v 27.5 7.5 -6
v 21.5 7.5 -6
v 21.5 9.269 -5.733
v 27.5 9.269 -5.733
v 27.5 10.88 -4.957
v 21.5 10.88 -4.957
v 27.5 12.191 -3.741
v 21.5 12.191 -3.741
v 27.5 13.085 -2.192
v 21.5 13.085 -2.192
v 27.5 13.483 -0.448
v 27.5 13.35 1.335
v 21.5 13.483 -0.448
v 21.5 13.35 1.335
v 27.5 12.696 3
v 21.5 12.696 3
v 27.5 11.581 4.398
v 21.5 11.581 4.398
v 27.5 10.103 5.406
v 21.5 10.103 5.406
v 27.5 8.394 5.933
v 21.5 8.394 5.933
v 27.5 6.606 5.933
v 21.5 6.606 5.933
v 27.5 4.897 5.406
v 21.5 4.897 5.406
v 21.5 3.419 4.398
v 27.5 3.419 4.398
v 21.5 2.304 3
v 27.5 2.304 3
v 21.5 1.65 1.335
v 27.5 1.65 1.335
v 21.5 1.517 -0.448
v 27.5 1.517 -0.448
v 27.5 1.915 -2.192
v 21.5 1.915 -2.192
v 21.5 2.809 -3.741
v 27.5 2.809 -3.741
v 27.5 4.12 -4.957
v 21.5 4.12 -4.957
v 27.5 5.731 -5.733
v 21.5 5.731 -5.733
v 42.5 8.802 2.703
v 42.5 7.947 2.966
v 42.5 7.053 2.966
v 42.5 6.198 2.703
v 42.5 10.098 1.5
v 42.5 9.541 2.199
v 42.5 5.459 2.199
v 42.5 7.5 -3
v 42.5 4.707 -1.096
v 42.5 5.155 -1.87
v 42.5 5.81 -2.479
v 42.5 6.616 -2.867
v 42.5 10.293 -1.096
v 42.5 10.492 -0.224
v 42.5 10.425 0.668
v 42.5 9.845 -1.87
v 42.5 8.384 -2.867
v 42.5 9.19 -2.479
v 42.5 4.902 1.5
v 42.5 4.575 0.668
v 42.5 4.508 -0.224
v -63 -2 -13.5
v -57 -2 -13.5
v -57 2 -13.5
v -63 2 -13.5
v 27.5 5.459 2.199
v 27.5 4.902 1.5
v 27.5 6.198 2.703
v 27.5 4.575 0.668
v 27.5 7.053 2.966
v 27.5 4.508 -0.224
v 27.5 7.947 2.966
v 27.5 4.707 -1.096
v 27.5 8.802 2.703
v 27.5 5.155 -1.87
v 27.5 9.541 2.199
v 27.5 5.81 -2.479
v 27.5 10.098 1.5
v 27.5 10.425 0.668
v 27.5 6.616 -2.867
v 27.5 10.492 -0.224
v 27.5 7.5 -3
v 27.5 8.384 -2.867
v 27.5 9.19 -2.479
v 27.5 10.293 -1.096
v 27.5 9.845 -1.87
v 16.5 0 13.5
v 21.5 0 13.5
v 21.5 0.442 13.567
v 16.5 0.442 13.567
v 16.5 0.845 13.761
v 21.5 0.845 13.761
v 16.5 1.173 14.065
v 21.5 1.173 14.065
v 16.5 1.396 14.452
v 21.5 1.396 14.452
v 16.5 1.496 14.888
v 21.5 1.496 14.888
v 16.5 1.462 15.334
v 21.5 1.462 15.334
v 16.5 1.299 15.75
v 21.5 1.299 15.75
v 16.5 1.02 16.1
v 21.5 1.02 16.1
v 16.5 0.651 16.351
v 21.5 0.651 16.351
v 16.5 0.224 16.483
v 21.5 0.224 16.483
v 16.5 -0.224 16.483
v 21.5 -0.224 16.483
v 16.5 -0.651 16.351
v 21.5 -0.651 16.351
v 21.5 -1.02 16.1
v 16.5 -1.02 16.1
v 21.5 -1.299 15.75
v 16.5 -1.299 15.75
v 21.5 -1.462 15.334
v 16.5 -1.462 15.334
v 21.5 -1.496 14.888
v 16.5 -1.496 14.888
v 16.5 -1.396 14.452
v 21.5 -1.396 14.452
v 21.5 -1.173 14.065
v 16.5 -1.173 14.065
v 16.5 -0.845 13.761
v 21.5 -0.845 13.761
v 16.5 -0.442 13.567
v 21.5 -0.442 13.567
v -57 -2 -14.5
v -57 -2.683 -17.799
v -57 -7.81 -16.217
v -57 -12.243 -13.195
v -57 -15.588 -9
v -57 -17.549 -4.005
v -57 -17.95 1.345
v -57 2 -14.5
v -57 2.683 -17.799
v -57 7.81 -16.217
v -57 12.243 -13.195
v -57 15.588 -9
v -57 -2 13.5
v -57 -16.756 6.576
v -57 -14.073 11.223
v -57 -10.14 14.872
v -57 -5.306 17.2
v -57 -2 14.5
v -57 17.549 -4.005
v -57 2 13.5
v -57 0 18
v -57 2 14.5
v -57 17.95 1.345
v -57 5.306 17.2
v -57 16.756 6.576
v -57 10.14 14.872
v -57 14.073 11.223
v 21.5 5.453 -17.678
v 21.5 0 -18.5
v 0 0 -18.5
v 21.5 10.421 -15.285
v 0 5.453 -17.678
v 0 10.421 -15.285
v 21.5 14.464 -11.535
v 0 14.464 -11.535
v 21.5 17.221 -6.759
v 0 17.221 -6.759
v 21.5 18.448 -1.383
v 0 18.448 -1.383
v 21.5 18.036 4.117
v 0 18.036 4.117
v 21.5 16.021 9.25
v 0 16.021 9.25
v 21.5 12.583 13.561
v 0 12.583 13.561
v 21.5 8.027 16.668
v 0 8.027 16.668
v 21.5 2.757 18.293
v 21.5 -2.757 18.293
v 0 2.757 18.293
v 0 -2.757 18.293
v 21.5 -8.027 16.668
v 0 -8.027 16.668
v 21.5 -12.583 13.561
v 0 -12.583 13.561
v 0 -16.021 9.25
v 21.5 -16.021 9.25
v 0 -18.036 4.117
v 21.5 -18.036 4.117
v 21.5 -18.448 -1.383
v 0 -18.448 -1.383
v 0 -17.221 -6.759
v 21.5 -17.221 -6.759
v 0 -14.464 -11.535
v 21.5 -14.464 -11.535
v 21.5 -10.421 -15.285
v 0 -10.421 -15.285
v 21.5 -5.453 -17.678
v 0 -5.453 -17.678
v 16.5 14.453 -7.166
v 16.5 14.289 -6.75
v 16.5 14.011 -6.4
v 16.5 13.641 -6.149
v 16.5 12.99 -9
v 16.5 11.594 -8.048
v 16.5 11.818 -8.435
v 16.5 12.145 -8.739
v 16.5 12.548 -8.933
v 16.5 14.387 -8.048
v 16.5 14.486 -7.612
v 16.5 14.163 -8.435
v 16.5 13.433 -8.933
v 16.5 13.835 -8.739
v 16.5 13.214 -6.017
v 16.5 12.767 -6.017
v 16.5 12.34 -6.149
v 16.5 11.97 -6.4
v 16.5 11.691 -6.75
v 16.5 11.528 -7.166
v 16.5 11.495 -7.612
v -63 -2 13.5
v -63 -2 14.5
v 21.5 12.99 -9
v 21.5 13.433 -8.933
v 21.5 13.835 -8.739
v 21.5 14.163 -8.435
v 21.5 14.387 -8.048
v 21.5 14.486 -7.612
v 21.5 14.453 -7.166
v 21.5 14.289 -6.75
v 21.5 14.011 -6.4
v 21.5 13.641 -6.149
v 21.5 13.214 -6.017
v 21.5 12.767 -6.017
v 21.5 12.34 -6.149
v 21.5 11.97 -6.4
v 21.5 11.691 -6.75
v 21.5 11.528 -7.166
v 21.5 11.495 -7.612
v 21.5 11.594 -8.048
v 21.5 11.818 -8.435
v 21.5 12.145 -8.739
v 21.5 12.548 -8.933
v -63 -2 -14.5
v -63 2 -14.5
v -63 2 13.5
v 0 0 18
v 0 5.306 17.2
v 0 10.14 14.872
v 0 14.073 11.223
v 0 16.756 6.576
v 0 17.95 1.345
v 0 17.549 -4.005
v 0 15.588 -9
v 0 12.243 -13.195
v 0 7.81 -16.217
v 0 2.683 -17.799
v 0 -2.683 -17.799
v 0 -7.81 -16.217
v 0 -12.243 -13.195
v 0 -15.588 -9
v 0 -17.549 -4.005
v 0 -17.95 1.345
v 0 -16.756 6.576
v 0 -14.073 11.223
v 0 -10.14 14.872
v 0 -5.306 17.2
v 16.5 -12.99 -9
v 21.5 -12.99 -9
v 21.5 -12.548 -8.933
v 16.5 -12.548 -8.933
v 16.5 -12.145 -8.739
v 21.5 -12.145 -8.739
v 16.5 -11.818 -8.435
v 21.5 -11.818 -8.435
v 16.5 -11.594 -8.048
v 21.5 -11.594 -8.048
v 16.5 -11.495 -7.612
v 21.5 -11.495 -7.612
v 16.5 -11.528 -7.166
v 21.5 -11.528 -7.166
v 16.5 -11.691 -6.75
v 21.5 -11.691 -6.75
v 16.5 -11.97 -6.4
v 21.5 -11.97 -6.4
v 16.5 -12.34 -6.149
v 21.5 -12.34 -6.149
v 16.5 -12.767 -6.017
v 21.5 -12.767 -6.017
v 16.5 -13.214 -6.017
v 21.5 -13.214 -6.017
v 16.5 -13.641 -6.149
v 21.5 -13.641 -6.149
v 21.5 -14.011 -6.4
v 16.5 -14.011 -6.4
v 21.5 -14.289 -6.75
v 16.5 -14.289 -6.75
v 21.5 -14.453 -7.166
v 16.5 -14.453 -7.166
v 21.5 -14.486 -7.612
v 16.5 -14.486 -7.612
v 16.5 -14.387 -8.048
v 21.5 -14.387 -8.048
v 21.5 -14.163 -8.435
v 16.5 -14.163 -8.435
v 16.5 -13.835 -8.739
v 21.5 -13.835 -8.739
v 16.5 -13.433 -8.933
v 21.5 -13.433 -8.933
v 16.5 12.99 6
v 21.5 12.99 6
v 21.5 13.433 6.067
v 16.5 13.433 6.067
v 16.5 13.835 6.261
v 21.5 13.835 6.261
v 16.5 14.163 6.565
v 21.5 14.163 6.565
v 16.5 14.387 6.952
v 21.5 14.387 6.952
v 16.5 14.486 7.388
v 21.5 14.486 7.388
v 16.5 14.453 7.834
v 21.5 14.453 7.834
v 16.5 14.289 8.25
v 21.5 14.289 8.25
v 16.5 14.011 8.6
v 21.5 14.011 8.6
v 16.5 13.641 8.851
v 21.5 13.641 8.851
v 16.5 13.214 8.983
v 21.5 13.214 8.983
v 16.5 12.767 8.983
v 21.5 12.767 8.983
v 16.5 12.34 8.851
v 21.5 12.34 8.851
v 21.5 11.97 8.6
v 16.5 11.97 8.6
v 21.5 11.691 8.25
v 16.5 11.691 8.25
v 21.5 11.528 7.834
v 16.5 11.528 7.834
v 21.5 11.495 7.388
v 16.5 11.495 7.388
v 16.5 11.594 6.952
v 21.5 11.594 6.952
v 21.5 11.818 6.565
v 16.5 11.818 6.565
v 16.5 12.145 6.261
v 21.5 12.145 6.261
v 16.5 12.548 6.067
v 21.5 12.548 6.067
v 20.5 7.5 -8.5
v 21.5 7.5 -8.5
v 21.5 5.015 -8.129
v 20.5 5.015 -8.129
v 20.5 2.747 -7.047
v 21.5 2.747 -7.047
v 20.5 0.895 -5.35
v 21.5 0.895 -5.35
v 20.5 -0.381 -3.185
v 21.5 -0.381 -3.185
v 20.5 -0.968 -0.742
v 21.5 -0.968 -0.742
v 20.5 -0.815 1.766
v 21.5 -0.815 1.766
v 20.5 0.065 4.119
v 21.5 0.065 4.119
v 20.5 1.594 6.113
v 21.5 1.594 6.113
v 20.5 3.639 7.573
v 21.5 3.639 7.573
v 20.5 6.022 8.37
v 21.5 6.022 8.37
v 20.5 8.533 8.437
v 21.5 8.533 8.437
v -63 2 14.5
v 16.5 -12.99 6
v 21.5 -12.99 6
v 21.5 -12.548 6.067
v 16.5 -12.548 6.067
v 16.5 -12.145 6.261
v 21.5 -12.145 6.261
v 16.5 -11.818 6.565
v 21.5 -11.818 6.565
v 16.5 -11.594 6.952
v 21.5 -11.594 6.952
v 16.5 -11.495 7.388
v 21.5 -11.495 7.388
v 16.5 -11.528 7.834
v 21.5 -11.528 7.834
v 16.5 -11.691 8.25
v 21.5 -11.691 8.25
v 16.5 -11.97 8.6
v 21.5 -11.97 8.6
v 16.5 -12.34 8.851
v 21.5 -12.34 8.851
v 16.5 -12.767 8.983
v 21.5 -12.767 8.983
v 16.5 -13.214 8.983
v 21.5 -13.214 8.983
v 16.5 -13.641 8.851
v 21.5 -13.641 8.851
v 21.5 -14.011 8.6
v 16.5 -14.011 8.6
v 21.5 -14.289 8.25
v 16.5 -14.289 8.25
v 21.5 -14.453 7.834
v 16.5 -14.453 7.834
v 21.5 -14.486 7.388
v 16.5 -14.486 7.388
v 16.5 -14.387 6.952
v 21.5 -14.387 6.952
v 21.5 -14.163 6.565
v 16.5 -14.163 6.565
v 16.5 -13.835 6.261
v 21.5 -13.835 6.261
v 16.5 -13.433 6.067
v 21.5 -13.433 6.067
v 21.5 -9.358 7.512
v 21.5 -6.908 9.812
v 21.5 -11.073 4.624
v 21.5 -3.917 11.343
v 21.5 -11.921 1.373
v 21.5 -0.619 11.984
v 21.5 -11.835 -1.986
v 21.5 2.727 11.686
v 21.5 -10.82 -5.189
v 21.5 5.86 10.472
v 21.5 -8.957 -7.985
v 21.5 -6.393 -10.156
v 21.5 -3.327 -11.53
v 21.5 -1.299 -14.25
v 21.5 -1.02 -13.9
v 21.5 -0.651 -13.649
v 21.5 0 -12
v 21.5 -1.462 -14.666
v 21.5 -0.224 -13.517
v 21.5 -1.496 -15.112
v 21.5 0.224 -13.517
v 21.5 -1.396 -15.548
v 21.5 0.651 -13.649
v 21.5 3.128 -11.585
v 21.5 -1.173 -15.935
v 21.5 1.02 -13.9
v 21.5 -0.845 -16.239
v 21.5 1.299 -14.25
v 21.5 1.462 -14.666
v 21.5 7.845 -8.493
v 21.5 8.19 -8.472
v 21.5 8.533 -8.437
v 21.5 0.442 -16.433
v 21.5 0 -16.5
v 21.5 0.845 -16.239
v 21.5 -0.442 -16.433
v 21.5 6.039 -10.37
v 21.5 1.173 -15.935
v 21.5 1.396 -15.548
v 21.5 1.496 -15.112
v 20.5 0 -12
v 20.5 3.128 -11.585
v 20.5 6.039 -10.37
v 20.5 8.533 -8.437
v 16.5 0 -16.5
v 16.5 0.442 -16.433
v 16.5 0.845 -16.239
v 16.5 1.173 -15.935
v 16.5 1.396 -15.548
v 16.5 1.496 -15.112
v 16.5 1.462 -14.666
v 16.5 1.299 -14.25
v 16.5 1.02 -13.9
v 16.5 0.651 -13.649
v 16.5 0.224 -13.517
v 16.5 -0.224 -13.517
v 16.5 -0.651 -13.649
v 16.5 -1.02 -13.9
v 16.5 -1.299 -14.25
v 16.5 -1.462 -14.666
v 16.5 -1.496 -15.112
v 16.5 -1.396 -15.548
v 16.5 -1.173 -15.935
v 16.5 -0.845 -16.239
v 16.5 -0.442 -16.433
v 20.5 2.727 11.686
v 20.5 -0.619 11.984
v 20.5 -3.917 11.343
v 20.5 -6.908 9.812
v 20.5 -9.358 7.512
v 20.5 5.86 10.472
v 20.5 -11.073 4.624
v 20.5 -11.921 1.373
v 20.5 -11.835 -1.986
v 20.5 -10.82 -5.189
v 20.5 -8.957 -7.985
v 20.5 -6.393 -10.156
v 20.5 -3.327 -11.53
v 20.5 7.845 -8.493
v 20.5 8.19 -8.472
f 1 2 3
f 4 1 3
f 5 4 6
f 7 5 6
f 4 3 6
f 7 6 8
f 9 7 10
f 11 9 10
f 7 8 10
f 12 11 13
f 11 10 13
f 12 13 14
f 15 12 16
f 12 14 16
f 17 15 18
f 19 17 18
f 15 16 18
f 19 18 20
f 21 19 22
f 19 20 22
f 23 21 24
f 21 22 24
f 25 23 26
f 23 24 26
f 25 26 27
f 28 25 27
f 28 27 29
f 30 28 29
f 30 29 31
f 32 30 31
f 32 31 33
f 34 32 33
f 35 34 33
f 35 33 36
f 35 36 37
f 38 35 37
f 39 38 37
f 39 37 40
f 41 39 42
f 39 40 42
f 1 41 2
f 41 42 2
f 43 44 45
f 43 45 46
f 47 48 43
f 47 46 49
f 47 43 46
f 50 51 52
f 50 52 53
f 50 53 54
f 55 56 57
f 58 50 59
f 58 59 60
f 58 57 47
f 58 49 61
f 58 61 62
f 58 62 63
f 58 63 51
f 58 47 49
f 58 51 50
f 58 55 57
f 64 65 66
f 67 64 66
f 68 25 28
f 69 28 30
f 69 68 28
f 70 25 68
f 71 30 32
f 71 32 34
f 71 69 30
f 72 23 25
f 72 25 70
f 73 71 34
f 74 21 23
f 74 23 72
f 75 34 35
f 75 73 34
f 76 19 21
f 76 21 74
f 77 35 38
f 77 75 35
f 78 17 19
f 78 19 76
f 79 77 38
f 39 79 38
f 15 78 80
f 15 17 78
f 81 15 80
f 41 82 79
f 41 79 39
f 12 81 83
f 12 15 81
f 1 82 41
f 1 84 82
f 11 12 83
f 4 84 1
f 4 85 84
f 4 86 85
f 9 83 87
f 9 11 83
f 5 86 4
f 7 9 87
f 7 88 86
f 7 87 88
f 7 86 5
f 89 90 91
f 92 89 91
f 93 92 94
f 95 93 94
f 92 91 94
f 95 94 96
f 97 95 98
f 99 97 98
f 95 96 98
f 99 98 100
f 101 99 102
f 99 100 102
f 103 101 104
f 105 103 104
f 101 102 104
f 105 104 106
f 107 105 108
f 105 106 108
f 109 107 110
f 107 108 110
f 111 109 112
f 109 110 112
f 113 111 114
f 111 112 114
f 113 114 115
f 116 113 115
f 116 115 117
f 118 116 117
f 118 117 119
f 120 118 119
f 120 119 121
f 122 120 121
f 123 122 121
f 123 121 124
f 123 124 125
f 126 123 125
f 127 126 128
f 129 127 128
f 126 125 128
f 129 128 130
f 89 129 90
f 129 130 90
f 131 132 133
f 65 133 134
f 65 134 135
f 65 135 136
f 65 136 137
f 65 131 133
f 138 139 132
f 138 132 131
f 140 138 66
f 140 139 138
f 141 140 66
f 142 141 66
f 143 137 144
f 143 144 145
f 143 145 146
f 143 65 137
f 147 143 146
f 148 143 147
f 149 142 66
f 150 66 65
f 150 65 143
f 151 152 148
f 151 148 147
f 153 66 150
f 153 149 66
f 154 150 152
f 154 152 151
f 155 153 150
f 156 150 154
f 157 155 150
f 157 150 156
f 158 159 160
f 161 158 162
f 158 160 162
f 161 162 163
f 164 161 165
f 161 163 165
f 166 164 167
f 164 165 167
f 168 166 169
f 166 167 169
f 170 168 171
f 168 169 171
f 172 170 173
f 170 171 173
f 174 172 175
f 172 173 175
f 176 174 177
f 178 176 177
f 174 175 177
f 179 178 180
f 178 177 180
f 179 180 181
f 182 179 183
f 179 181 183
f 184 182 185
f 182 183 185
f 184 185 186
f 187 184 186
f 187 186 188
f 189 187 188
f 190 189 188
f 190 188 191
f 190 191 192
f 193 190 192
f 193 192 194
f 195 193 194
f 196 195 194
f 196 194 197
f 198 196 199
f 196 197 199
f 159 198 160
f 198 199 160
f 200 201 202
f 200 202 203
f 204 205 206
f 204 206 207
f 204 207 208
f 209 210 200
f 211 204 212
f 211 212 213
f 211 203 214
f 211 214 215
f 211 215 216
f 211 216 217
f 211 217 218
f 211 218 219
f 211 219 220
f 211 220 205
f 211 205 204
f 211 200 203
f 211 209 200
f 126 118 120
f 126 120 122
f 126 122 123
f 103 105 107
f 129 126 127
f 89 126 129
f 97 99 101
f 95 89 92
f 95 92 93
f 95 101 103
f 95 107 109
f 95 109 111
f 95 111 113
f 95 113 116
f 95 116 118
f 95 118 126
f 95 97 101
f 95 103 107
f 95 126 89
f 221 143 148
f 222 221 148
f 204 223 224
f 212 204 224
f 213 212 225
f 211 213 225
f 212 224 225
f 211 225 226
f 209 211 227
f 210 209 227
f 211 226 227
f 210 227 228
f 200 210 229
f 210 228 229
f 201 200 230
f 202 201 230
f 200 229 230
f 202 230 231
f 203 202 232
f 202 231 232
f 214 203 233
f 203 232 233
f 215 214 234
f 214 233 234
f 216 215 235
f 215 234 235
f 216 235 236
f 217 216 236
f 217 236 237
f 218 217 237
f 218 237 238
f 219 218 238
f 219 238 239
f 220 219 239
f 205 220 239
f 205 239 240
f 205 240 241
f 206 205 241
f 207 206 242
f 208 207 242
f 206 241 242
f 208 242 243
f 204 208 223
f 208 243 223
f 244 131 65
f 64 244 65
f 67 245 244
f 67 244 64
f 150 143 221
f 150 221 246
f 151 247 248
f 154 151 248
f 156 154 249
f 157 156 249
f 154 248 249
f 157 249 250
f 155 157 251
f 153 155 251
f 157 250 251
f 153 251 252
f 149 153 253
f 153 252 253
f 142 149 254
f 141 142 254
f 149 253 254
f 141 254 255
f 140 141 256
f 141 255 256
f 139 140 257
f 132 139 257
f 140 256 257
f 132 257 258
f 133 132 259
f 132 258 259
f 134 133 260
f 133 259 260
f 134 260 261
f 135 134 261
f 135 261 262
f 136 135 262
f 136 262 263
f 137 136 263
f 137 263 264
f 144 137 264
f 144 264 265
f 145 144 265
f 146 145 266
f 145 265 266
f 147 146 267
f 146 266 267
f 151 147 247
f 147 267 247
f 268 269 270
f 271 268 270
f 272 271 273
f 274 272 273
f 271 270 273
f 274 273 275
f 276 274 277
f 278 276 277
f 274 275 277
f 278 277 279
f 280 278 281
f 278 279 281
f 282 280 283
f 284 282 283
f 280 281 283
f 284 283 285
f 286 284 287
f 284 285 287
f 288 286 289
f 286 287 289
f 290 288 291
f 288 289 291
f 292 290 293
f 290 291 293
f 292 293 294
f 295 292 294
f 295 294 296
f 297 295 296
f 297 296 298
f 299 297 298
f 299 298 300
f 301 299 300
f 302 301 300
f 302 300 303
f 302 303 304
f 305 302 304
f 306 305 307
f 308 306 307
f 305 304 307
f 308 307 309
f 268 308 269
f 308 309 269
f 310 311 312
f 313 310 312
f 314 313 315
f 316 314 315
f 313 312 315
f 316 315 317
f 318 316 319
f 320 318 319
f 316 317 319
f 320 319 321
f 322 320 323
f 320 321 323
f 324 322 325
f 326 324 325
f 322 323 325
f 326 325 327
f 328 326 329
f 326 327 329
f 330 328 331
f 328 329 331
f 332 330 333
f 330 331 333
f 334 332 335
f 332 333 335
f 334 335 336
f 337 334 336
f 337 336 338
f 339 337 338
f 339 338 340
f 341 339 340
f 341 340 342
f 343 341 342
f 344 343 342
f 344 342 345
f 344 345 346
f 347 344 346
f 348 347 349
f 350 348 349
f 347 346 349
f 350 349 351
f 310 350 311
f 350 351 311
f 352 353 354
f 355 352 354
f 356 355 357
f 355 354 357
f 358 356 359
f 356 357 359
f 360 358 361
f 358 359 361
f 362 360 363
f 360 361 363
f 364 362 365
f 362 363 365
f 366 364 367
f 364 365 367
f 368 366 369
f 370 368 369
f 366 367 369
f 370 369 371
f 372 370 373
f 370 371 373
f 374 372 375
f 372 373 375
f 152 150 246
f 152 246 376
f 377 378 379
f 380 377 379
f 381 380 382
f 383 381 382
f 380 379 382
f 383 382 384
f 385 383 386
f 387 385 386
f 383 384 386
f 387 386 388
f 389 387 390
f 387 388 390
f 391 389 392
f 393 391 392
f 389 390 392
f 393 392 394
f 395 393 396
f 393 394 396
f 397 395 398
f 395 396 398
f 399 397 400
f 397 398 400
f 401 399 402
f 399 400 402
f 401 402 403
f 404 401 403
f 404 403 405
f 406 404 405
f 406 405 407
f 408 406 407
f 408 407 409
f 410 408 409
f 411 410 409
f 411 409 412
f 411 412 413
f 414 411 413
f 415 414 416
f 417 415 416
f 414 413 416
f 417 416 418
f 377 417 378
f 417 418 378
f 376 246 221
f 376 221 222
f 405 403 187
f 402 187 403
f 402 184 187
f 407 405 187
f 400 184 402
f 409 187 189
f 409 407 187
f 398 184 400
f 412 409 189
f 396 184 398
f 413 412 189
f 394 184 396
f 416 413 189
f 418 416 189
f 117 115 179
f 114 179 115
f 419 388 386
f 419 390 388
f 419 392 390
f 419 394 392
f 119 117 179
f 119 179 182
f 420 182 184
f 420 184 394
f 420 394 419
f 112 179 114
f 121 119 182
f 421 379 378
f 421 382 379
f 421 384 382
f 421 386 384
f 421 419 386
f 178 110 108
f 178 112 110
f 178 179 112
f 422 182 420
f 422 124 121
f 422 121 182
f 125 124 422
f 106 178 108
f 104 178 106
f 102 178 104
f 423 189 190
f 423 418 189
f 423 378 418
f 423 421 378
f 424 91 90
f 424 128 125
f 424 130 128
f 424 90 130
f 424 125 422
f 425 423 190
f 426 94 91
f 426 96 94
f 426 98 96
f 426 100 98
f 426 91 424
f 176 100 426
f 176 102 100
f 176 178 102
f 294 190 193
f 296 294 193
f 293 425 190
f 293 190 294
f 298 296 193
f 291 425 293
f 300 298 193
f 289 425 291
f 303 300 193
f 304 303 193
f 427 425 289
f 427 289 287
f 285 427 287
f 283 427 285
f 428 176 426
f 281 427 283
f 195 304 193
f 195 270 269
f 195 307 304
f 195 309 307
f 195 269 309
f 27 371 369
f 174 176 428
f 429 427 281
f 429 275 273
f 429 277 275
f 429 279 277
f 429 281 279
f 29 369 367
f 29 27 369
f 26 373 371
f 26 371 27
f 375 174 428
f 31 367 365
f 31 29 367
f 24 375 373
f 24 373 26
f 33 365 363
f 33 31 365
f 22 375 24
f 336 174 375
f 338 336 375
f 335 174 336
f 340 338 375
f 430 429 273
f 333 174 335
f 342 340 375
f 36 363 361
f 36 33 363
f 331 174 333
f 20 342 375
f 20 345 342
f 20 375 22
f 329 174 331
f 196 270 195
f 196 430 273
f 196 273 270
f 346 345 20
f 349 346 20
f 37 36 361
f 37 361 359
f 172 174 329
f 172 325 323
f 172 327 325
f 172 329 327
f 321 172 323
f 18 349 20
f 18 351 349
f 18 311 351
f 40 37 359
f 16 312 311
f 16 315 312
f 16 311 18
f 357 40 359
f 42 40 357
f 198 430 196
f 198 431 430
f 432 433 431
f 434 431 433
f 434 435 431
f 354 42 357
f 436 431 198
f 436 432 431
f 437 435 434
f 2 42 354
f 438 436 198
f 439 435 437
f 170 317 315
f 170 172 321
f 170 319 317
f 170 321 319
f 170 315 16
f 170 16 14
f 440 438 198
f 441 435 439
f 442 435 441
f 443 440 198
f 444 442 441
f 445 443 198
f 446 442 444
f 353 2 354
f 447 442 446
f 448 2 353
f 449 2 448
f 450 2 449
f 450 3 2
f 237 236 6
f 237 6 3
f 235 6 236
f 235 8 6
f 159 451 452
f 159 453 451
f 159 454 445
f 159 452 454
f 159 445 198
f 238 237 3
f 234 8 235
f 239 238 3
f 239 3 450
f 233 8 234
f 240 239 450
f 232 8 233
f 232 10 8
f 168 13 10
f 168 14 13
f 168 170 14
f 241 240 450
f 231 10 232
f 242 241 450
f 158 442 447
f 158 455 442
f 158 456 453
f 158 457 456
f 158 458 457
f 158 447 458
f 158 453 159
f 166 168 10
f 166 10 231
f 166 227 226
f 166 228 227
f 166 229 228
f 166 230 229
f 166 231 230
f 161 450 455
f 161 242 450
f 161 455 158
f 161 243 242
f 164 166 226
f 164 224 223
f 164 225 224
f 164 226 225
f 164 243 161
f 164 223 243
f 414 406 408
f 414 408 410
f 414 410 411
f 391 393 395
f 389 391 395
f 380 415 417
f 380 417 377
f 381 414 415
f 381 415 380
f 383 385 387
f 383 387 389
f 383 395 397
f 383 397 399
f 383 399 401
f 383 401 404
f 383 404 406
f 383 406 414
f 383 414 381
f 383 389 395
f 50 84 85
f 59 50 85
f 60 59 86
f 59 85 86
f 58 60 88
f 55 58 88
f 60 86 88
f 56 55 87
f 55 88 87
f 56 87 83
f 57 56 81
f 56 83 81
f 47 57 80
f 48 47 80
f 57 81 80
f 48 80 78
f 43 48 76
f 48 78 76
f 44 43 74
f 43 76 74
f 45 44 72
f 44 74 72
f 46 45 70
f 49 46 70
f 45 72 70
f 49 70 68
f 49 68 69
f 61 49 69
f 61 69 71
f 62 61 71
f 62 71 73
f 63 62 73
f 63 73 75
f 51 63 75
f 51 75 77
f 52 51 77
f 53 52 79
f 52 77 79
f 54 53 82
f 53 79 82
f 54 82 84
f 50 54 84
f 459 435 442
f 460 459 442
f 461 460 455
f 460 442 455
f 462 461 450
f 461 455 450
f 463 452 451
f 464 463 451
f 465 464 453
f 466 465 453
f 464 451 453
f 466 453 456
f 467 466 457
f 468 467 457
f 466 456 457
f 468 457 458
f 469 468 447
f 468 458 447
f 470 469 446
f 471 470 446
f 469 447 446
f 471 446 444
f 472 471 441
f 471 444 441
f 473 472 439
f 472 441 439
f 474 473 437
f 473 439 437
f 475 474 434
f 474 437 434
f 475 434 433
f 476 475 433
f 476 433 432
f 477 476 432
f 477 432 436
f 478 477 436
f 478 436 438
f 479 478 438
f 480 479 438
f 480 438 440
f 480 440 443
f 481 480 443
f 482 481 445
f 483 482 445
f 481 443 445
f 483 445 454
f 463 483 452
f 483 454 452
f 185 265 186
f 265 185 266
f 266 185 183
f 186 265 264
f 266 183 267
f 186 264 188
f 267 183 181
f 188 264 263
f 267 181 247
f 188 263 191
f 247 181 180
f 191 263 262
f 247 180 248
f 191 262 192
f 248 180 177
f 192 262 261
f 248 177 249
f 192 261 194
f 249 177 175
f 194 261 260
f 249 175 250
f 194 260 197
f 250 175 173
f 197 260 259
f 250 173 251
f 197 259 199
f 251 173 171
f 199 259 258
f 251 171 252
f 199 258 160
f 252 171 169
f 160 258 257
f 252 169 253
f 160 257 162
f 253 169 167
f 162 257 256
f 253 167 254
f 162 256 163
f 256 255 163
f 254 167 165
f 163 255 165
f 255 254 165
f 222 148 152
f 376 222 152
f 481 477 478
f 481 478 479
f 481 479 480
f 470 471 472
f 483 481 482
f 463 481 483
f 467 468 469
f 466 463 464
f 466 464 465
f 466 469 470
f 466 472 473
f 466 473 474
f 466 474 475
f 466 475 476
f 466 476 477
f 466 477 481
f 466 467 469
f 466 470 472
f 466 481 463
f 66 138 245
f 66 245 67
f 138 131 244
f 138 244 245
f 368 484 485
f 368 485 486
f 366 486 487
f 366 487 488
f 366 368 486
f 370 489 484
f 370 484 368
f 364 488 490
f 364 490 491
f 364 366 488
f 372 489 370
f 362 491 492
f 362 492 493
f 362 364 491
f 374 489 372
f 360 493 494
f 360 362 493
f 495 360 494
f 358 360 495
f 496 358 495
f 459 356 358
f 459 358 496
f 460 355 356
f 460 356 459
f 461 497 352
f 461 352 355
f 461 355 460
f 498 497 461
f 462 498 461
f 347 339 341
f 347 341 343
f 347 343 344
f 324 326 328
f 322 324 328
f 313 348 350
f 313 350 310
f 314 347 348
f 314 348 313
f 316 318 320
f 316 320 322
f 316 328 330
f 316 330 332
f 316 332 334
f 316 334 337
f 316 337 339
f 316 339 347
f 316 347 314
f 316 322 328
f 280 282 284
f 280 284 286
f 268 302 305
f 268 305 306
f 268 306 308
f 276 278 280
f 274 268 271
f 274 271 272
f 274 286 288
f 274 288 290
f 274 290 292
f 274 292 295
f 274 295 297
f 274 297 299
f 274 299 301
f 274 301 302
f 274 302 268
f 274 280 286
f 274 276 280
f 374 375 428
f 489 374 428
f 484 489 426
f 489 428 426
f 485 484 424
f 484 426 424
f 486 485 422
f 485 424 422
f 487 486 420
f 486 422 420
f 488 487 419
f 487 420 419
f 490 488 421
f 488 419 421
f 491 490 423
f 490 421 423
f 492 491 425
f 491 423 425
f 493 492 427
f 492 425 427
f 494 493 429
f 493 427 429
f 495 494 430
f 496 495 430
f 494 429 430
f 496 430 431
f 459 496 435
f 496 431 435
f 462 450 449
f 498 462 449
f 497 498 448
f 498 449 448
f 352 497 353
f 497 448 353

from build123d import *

# Parameters (mm, degrees)
SKETCH1_R           = 18.5
BOSS_EXTRUDE1_DEPTH = 21.5
SKETCH2_R           = 18
BOSS_EXTRUDE2_DEPTH = 57
SKETCH3_W           = 1
SKETCH3_H           = 4
BOSS_EXTRUDE3_DEPTH = 6
SKETCH4_R           = 6
BOSS_EXTRUDE4_DEPTH = 6
SKETCH5_R           = 3
BOSS_EXTRUDE5_DEPTH = 15
CUT_EXTRUDE1_DEPTH  = 1
SKETCH7_R           = 1.5
CUT_EXTRUDE2_DEPTH  = 5


with BuildPart() as part:
    # Sketch1 → Boss-Extrude1 (new body)
    with BuildSketch(Plane(origin=(0, 0, 0), x_dir=(0, 0, -1), z_dir=(1, 0, 0))):
        Circle(SKETCH1_R)
    extrude(amount=BOSS_EXTRUDE1_DEPTH)

    # Sketch2 → Boss-Extrude2 (add)
    with BuildSketch(Plane.ZY):
        Circle(SKETCH2_R)
    extrude(amount=BOSS_EXTRUDE2_DEPTH)

    # Sketch3 → Boss-Extrude3 (add)
    with BuildSketch(Plane.ZY.offset(57)):
        with Locations((-14, 0)):
            Rectangle(SKETCH3_W, SKETCH3_H)
        with Locations((14, 0)):
            Rectangle(SKETCH3_W, SKETCH3_H)
    extrude(amount=BOSS_EXTRUDE3_DEPTH)

    # Sketch4 → Boss-Extrude4 (add)
    with BuildSketch(Plane(origin=(21.5, 0, 0), x_dir=(0, 0, -1), z_dir=(1, 0, 0))):
        with Locations((0, 7.5)):
            Circle(SKETCH4_R)
    extrude(amount=BOSS_EXTRUDE4_DEPTH)

    # Sketch5 → Boss-Extrude5 (add)
    with BuildSketch(Plane(origin=(27.5, 0, 0), x_dir=(0, 0, -1), z_dir=(1, 0, 0))):
        with Locations((0, 7.5)):
            Circle(SKETCH5_R)
    extrude(amount=BOSS_EXTRUDE5_DEPTH)

    # Sketch6 → Cut-Extrude1 (cut)
    with BuildSketch(Plane(origin=(21.5, 0, 0), x_dir=(0, 0, -1), z_dir=(1, 0, 0))):
        with BuildLine():
            ThreePointArc((-8.436955744, 8.533333333), (-4.623663649, -11.073469847), (12, 0))
            ThreePointArc((12, 0), (11.073469847, 4.623663649), (8.436955744, 8.533333333))
            ThreePointArc((8.436955744, 8.533333333), (8.484224296, 8.017627365), (8.5, 7.5))
            ThreePointArc((8.5, 7.5), (-0.517627365, -0.984224296), (-8.436955744, 8.533333333))
        make_face()
    extrude(amount=-CUT_EXTRUDE1_DEPTH, mode=Mode.SUBTRACT)

    # Sketch7 → Cut-Extrude2 (cut)
    with BuildSketch(Plane(origin=(21.5, 0, 0), x_dir=(0, 0, -1), z_dir=(1, 0, 0))):
        with Locations((-15, 0)):
            Circle(SKETCH7_R)
        with Locations((-7.5, 12.990381057)):
            Circle(SKETCH7_R)
        with Locations((7.5, 12.990381057)):
            Circle(SKETCH7_R)
        with Locations((15, 0)):
            Circle(SKETCH7_R)
        with Locations((7.5, -12.990381057)):
            Circle(SKETCH7_R)
        with Locations((-7.5, -12.990381057)):
            Circle(SKETCH7_R)
    extrude(amount=-CUT_EXTRUDE2_DEPTH, mode=Mode.SUBTRACT)


solid = part.part
